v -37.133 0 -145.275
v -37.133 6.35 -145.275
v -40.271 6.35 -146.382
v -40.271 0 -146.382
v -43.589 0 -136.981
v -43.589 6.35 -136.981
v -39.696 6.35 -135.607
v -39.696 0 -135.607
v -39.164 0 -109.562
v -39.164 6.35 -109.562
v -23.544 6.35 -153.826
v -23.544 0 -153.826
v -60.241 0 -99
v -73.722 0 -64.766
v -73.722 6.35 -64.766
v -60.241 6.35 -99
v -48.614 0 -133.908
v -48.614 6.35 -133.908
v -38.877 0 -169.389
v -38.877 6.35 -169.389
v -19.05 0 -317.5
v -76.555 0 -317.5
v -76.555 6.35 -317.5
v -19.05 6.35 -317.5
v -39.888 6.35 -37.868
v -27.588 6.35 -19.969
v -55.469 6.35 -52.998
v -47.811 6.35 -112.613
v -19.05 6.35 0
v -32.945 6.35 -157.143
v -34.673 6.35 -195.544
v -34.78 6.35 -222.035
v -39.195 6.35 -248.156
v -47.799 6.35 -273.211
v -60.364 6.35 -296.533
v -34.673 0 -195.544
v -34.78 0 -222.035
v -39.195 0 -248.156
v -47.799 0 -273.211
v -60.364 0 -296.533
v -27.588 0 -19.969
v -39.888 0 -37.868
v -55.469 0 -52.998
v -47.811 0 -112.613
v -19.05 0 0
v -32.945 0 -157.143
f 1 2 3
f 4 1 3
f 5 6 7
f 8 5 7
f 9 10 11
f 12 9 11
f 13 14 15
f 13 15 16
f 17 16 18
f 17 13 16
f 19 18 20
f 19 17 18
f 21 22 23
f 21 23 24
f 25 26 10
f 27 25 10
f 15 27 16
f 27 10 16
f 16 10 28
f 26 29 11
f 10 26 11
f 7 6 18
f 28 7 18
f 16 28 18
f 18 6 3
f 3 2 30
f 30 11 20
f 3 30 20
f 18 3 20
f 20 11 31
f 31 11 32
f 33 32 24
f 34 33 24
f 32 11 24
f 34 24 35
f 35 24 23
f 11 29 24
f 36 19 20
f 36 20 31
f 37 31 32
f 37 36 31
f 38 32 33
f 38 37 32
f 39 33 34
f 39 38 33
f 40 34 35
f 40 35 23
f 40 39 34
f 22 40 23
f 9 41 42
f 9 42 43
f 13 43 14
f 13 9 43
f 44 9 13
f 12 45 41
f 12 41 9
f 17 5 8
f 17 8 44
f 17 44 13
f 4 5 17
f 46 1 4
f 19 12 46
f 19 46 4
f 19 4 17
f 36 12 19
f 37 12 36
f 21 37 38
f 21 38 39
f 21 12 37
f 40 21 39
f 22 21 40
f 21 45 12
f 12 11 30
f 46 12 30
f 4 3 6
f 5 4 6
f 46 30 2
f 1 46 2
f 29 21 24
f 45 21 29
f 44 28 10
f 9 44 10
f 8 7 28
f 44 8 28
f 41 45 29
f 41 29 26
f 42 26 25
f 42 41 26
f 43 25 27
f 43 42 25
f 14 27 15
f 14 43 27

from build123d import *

# Parameters (mm, degrees)
BOSS_EXTRUDE1_DEPTH = 6.35
SKETCH3_W           = 19.05
SKETCH3_H           = 169.388632852
CUT_EXTRUDE3_DEPTH  = 327.660693329
CUT_EXTRUDE2_DEPTH  = 327.660693329


with BuildPart() as part:
    # Sketch1 → Boss-Extrude1 (new body)
    with BuildSketch(Plane(origin=(0, 0, 0), x_dir=(1, 0, 0), z_dir=(0, 1, 0))):
        with BuildLine():
            Line((0, 169.388632852), (0, 0))
            Line((0, 0), (-19.05, 0))
            ThreePointArc((-19.05, 0), (-39.88804557, 37.868270719), (-73.722410895, 64.765590165))
            ThreePointArc((-73.722410895, 64.765590165), (-54.193392954, 116.375662835), (-38.876501861, 169.388632852))
            ThreePointArc((-38.876501861, 169.388632852), (-39.194658591, 248.155900408), (-76.554791267, 317.5))
            Line((-76.554791267, 317.5), (-19.05, 317.5))
            Line((-19.05, 317.5), (-19.05, 169.388632852))
            Line((-19.05, 169.388632852), (0, 169.388632852))
        make_face()
    extrude(amount=BOSS_EXTRUDE1_DEPTH)

    # Sketch3 → Cut-Extrude3 (cut, through all)
    with BuildSketch(Plane(origin=(0, 6.35, 0), x_dir=(1, 0, 0), z_dir=(0, 1, 0))):
        with Locations((-9.525, 84.694316426)):
            Rectangle(SKETCH3_W, SKETCH3_H)
    extrude(amount=-CUT_EXTRUDE3_DEPTH, mode=Mode.SUBTRACT)

    # Sketch2 → Cut-Extrude2 (cut, through all)
    with BuildSketch(Plane(origin=(0, 6.35, 0), x_dir=(1, 0, 0), z_dir=(0, 1, 0))):
        Polygon((-39.164098049, 109.561842364), (-23.543572116, 153.825683885), (-32.944847981, 157.143355113), (-37.133143759, 145.274992843), (-40.27089443, 146.38229203), (-43.588565658, 136.981016166), (-39.696317688, 135.607458014), (-47.810876614, 112.613254626), align=None)
    extrude(amount=-CUT_EXTRUDE2_DEPTH, mode=Mode.SUBTRACT)


solid = part.part
